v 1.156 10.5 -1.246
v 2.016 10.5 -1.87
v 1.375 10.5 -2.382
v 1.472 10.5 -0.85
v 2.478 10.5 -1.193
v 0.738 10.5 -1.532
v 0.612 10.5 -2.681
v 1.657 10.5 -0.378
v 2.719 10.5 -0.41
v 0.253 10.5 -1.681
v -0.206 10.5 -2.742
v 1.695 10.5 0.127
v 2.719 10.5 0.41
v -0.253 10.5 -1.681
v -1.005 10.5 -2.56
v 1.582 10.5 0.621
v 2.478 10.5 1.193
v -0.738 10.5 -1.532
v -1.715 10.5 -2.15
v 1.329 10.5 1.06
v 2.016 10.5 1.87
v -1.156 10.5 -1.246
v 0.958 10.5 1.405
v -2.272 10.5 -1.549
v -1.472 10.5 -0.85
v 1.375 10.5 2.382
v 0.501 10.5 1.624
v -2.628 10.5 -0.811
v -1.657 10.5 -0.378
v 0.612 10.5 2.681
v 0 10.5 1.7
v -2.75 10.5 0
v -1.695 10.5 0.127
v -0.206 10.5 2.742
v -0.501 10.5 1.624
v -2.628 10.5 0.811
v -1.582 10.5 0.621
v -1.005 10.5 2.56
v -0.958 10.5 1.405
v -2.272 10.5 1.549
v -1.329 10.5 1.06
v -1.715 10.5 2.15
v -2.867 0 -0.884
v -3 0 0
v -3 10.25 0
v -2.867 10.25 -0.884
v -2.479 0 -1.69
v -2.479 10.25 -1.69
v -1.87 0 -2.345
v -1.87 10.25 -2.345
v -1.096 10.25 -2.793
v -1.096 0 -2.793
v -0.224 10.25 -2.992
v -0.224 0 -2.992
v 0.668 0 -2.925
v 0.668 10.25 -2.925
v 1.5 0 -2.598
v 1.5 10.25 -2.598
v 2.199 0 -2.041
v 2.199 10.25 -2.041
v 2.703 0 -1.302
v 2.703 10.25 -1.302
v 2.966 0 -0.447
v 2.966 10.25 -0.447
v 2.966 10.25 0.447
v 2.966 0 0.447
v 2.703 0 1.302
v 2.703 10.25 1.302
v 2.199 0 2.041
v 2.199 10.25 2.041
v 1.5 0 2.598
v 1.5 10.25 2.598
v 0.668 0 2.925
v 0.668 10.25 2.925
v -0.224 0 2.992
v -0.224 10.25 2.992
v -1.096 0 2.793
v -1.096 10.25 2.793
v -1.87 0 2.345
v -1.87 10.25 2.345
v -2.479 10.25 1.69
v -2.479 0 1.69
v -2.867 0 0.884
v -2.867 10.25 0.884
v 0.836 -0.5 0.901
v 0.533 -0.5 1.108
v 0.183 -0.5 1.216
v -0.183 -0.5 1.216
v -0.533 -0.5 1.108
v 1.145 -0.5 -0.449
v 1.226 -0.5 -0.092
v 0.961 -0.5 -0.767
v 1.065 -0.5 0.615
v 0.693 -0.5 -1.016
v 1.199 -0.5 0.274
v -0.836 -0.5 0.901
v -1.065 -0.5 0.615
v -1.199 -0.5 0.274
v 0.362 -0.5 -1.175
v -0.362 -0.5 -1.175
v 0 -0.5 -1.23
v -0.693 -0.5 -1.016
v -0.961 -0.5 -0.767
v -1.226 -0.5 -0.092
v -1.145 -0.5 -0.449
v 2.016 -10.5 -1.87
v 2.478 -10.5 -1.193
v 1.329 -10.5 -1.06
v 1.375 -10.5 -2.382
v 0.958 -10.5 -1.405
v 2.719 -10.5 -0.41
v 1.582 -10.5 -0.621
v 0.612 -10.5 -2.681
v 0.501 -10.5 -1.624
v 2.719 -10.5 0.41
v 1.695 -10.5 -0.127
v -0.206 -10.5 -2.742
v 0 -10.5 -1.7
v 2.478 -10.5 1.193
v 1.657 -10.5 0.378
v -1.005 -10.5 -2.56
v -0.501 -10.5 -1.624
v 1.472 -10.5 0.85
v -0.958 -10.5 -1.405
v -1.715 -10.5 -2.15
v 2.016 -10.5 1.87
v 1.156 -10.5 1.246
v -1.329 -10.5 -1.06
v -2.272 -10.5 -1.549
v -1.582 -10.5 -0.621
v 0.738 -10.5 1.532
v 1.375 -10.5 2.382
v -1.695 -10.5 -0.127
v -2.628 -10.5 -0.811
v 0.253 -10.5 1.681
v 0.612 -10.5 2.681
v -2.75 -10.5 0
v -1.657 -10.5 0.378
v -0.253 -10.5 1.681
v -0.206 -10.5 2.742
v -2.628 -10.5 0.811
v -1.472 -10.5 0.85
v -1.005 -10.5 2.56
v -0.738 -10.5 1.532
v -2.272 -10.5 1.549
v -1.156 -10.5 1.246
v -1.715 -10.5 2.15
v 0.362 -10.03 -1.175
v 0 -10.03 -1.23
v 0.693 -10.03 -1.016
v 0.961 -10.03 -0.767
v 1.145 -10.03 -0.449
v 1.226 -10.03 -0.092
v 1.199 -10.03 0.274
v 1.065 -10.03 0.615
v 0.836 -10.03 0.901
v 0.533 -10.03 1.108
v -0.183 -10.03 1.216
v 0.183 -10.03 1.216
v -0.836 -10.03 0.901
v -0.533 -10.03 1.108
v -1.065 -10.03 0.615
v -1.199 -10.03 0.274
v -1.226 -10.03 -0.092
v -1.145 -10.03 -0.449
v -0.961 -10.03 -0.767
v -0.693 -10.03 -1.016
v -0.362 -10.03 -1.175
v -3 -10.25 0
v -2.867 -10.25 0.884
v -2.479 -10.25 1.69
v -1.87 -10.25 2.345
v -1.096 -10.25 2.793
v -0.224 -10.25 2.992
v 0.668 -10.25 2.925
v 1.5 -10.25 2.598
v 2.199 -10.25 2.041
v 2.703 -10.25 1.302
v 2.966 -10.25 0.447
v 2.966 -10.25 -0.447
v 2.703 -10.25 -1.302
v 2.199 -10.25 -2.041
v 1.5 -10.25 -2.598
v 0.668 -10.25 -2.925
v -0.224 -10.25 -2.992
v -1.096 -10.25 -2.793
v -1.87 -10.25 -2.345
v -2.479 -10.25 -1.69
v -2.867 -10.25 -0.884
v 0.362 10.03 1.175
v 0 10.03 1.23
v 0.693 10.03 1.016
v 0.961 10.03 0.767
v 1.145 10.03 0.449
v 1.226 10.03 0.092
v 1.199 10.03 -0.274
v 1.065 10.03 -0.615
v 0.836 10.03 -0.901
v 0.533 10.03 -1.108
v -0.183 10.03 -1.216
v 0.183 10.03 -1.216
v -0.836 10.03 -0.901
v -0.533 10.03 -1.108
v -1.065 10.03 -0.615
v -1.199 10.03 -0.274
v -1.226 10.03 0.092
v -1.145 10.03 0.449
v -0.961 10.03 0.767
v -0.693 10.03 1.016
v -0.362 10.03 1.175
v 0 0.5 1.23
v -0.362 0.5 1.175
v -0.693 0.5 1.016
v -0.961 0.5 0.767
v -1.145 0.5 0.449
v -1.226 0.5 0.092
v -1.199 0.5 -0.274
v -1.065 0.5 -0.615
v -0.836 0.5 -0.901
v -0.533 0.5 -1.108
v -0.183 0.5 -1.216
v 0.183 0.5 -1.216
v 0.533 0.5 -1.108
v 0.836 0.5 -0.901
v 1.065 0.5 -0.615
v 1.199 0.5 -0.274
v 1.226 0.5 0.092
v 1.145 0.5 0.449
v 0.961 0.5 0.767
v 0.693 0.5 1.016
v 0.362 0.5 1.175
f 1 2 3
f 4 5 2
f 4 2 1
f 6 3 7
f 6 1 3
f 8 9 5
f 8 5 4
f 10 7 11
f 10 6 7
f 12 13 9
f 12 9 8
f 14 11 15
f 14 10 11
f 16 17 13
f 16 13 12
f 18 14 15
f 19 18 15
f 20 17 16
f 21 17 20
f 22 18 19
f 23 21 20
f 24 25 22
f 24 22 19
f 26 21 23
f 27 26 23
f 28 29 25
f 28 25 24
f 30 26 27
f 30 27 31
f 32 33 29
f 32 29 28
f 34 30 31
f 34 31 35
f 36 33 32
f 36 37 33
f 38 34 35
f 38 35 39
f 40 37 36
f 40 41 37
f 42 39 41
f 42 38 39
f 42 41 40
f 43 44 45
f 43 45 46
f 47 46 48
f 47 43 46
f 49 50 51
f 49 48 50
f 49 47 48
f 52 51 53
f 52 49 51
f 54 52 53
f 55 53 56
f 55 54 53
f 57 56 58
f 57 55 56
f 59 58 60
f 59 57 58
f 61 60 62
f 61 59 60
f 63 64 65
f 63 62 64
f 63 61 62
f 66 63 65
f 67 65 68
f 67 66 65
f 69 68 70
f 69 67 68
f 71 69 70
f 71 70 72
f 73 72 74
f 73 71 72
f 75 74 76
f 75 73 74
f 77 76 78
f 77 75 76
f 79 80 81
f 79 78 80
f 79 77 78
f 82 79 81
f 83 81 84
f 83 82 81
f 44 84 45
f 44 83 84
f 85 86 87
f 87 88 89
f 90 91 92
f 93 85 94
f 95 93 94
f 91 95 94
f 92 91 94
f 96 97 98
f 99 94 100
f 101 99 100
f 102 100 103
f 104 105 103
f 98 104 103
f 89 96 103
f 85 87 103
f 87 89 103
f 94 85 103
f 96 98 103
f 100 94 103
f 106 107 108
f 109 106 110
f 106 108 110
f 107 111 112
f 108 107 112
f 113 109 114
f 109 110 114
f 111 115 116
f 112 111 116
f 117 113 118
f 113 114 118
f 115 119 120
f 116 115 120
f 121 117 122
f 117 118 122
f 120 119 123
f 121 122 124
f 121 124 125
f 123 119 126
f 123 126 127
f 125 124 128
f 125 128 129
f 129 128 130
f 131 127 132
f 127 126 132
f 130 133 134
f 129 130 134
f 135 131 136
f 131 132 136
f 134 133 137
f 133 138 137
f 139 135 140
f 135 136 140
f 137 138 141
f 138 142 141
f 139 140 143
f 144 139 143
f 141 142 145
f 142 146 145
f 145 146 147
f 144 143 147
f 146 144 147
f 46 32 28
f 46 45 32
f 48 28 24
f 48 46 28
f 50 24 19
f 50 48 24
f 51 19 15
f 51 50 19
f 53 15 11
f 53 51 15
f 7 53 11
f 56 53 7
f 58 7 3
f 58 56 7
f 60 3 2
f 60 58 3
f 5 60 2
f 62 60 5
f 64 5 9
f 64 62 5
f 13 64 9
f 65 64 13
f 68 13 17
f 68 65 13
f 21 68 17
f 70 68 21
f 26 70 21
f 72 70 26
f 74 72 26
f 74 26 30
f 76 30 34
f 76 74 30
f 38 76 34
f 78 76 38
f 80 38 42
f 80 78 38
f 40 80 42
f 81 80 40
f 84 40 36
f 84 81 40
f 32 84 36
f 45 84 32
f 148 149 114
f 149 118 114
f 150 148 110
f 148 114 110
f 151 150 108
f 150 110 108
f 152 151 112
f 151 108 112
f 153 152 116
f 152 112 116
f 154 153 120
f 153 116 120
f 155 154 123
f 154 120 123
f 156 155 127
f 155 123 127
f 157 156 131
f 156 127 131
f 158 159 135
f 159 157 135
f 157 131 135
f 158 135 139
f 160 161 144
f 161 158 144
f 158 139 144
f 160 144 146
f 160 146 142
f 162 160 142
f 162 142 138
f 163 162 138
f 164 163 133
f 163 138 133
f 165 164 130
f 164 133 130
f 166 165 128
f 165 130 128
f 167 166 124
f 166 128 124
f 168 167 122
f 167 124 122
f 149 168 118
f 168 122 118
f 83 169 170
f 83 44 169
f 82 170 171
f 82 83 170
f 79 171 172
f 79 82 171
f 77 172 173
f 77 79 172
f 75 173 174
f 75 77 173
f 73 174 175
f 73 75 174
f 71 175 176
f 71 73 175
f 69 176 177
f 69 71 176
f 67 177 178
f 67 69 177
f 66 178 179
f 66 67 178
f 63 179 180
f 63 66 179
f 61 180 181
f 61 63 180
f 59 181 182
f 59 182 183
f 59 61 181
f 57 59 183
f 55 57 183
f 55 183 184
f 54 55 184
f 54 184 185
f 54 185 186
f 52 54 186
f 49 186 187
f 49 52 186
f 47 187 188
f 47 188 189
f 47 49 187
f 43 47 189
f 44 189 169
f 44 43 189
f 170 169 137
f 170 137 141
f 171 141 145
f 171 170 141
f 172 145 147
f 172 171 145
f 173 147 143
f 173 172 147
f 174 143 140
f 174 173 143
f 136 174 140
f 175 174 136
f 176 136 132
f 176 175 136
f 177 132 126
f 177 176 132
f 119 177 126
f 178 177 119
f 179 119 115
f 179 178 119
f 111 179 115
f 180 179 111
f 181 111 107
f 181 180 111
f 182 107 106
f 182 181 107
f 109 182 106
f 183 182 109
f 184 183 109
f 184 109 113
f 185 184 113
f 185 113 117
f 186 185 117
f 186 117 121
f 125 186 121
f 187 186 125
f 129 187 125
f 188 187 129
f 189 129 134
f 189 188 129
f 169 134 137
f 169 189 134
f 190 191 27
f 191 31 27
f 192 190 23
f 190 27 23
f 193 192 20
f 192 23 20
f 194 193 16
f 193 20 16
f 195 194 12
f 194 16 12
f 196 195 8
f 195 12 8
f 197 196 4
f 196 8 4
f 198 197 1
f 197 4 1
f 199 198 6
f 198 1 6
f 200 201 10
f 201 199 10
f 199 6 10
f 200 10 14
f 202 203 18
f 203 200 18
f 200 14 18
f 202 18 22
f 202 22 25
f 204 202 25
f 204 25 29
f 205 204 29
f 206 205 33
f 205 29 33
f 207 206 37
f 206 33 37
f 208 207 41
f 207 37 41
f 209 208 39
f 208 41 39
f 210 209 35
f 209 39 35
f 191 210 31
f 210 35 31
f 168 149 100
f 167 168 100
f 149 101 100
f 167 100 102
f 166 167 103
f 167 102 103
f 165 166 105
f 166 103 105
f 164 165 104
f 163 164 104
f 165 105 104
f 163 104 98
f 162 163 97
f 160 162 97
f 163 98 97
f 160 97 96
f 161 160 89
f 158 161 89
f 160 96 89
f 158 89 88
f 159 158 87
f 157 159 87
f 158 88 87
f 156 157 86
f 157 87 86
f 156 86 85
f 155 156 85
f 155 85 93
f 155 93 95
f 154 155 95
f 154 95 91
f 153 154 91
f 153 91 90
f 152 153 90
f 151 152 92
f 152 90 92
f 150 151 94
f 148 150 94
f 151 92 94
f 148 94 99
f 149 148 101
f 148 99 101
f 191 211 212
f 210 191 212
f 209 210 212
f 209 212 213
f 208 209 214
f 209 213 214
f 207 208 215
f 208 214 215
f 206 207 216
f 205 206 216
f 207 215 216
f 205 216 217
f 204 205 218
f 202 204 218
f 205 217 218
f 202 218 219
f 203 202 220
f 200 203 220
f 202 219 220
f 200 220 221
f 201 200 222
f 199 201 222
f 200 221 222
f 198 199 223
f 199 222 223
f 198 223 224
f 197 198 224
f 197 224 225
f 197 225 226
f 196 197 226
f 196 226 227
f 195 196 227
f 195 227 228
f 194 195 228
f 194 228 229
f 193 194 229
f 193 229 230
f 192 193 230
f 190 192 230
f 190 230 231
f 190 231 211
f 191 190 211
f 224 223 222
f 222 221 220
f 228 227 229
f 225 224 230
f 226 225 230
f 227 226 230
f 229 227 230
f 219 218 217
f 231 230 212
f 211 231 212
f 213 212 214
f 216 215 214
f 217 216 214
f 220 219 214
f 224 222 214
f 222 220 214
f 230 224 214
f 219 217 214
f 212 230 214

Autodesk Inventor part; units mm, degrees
ref_plane "YZ Plane" through (0, 0, 0) normal (1, 0, 0) x (0, 1, 0)
ref_plane "XZ Plane" through (0, 0, 0) normal (0, 1, 0) x (-1, 0, 0)
ref_plane "XY Plane" through (0, 0, 0) normal (0, 0, 1) x (1, 0, 0)
sketch "スケッチ1" plane through (0, 0, 0) normal (0, 1, 0) x (-1, 0, 0)
  circle A0 centre (0, 0) radius 3
  dimension "d0" = 6
extrude "押し出し1" add sketch "スケッチ1" along normal mid plane 21
sketch "スケッチ2" plane through (0, 10.5, 0) normal (0, 1, 0) x (1, 0, 0)
  point P0 (0, 0)
  point P1 (0, 0)
hole "穴1" at (0, 10.5, 0) direction (0, -1, 0) diameter 2.459 depth 10 countersink diameter 3.4 countersink angle 90 thread size "M3x0.5" class "6H" standard "ISO Metric profile"
sketch "スケッチ3" plane through (0, -10.5, 0) normal (0, -1, 0) x (1, 0, 0)
  point P0 (0, 0)
  point P1 (0, 0)
hole "穴2" at (0, -10.5, 0) direction (0, 1, 0) diameter 2.459 depth 10 countersink diameter 3.4 countersink angle 90 thread size "M3x0.5" class "6H" standard "ISO Metric profile"
chamfer "面取り1" distance 0.25 angle 45 2 edges at (3, -10.5, 0) (3, 10.5, 0)
properties part number "Spacer_M3D6L60" material "アルミニウム 6061"
